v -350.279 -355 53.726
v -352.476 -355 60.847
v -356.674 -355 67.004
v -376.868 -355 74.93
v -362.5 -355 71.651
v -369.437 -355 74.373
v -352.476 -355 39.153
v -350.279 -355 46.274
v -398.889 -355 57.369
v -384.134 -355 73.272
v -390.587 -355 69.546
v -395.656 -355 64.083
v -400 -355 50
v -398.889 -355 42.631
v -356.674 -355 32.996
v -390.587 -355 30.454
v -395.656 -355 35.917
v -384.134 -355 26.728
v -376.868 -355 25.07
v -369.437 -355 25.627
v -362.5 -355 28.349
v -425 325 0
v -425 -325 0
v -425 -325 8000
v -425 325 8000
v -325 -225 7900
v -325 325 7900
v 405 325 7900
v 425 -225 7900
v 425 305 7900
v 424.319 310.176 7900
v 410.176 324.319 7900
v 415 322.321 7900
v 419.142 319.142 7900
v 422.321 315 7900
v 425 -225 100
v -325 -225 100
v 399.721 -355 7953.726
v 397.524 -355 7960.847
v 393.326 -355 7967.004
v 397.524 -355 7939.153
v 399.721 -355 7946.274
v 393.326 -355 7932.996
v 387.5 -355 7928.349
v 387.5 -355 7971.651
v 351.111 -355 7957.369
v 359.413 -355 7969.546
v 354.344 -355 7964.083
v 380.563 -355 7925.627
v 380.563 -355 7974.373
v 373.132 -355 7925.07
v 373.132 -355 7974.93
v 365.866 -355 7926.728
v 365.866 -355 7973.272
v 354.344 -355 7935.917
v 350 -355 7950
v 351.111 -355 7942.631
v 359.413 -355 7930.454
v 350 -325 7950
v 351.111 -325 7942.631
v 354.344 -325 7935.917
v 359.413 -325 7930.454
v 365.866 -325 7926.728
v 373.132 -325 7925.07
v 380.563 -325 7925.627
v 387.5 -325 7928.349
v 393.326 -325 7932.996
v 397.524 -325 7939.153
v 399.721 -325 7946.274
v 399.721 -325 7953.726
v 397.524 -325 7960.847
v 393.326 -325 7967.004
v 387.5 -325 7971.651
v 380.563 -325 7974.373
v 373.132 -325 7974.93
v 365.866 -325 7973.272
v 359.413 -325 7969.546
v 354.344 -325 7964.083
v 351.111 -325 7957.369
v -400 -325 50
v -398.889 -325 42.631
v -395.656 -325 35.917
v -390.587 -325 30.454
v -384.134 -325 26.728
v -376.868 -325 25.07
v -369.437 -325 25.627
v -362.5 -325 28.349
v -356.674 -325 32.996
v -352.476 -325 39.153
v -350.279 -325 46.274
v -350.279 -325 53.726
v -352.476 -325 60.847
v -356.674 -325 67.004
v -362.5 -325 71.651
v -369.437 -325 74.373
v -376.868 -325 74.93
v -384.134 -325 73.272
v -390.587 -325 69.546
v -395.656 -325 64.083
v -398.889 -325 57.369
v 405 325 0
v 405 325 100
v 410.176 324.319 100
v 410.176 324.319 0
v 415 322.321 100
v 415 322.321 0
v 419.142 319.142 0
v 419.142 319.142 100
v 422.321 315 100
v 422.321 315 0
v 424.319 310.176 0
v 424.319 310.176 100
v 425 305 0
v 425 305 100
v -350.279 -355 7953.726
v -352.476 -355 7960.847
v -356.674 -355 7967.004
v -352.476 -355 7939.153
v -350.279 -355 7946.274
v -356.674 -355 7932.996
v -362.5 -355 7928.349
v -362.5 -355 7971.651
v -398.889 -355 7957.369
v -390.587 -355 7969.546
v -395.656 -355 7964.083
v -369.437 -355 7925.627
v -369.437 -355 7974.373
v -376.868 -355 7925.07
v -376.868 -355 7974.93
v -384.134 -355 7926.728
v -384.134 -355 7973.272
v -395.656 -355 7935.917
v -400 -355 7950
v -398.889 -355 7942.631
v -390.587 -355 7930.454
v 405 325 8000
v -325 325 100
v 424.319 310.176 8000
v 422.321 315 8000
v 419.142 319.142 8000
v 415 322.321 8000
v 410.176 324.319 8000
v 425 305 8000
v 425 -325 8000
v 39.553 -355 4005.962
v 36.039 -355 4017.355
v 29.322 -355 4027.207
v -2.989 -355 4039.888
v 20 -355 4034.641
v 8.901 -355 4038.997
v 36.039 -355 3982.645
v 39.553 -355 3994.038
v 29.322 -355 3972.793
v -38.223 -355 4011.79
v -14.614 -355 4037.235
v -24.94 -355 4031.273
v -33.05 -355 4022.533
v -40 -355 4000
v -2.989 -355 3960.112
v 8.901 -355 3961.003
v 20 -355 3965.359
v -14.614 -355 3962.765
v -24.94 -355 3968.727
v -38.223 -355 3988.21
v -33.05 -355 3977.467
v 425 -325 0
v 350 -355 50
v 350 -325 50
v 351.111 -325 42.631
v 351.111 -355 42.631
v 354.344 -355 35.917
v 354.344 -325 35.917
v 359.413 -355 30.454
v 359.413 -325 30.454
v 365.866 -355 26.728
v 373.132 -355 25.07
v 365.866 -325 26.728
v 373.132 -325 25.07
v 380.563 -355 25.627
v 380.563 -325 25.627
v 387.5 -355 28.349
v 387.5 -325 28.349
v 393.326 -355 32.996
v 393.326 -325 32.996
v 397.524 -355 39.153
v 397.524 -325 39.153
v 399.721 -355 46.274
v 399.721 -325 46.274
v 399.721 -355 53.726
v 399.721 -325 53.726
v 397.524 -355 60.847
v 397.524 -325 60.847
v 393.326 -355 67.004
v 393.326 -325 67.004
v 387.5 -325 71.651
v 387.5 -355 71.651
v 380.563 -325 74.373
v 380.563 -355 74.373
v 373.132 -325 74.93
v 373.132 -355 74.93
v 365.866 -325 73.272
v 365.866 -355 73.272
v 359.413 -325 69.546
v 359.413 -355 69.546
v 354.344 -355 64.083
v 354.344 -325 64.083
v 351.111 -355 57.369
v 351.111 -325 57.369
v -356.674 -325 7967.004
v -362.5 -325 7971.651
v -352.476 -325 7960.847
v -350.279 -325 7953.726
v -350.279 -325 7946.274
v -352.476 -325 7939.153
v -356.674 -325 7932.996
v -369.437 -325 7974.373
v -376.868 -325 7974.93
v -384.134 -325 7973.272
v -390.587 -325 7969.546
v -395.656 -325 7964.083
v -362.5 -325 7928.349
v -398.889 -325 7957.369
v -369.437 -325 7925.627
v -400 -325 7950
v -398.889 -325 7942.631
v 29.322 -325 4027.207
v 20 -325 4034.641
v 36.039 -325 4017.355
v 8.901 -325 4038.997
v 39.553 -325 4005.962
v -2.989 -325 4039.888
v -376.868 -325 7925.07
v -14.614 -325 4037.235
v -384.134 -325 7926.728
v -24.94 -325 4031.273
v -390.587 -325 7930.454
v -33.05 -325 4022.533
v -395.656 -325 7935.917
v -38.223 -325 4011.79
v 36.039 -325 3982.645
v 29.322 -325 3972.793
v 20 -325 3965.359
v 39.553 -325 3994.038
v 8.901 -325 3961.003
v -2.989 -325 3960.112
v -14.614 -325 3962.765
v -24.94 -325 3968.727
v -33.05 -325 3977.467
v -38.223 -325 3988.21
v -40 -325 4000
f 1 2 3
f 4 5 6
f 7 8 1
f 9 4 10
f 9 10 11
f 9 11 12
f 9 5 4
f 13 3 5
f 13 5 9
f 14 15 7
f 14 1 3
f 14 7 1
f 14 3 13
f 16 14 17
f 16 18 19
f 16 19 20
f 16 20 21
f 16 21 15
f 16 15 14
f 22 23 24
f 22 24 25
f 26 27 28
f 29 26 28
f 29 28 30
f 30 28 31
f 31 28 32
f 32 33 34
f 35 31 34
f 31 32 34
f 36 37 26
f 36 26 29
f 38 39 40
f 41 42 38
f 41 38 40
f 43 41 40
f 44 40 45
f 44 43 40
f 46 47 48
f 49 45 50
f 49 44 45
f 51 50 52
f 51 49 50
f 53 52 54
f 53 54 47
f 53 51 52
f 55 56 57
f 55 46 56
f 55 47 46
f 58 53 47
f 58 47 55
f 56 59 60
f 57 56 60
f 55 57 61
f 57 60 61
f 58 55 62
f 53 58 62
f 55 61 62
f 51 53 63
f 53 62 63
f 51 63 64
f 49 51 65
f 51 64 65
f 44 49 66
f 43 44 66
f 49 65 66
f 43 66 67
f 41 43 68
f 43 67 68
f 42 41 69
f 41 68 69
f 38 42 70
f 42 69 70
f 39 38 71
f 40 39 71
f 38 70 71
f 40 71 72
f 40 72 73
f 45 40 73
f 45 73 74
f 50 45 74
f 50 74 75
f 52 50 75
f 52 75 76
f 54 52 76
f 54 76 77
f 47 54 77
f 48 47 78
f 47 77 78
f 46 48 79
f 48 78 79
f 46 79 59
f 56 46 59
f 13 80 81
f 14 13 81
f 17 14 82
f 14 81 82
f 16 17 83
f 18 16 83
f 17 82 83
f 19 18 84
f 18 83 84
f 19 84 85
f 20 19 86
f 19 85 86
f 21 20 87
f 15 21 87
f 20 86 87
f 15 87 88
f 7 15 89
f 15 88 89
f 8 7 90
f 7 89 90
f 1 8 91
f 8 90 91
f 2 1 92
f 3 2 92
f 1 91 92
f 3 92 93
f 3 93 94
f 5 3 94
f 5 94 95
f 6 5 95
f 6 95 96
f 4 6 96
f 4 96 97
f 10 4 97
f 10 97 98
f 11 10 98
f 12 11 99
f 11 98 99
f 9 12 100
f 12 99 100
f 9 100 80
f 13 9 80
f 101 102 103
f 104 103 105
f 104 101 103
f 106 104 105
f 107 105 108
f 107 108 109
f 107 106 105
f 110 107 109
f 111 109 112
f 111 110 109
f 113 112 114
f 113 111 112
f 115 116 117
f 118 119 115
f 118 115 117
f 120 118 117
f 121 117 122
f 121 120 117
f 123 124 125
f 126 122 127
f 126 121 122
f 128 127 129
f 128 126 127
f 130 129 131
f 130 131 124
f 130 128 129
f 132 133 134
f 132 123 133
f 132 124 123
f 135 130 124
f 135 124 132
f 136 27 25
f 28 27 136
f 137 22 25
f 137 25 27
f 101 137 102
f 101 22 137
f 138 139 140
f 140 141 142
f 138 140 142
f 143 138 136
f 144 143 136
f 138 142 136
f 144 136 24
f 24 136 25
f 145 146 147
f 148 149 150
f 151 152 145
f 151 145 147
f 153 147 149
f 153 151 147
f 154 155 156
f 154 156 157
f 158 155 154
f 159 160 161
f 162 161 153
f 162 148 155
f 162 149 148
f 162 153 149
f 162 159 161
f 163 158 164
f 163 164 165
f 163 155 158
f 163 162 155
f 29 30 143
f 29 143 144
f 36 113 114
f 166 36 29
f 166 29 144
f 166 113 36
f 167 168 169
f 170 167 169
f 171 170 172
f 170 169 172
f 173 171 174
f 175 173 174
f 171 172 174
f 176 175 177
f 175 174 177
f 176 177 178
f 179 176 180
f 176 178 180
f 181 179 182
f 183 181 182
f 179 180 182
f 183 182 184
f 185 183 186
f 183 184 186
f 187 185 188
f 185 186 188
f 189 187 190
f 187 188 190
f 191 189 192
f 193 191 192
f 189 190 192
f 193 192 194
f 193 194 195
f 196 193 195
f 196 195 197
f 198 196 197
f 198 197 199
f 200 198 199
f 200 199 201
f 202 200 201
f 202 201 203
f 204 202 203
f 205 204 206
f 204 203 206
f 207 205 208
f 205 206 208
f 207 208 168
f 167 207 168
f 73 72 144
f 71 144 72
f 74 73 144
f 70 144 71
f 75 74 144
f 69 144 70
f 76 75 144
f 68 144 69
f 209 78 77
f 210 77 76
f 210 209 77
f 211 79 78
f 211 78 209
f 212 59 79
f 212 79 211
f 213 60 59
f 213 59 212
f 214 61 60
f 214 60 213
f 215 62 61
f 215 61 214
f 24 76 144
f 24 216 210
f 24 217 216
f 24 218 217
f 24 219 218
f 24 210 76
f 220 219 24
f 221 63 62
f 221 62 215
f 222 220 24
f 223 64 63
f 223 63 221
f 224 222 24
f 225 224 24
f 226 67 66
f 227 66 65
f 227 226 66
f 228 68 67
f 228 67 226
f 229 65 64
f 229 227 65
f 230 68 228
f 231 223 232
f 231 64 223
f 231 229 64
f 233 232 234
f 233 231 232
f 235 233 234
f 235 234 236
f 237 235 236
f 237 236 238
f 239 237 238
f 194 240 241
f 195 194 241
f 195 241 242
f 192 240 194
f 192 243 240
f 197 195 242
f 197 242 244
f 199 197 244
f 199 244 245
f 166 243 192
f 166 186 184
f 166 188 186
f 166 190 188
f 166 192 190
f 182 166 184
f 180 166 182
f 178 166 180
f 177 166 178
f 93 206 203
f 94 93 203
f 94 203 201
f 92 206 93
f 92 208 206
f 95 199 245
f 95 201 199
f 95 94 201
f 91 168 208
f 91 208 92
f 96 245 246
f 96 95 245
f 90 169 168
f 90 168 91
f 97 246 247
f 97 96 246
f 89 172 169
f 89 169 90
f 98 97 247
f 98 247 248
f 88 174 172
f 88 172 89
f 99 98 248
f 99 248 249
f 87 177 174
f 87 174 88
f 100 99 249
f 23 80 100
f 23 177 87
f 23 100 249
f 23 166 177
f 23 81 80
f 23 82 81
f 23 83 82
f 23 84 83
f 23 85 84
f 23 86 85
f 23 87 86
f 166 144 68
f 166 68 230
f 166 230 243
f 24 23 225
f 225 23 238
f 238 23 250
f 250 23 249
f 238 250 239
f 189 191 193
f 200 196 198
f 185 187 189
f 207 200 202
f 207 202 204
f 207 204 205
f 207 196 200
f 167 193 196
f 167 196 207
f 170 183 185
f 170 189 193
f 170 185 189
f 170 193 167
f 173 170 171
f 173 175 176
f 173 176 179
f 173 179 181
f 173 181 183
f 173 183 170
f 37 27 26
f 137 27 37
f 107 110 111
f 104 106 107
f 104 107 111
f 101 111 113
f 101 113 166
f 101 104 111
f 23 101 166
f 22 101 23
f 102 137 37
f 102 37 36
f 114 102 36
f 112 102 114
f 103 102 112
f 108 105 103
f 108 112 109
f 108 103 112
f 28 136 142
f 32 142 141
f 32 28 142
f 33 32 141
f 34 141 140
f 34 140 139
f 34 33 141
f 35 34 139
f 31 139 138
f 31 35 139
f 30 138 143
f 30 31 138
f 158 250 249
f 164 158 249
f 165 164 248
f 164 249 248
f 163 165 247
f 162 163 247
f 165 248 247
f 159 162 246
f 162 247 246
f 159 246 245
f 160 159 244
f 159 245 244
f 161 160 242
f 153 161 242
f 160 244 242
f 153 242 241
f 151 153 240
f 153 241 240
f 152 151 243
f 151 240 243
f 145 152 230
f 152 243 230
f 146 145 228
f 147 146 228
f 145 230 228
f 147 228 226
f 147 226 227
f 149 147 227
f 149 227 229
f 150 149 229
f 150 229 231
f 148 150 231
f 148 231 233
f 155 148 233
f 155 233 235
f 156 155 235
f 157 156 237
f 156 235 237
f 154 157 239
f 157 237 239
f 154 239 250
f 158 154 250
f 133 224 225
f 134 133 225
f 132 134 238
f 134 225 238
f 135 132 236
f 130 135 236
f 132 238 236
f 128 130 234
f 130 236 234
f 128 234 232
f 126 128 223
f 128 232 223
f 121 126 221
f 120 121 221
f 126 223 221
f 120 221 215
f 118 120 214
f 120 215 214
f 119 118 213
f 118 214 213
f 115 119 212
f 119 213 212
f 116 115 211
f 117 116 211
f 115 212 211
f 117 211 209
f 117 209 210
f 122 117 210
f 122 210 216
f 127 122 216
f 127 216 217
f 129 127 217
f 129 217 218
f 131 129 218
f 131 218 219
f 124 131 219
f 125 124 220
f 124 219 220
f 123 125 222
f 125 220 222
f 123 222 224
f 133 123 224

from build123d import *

# Parameters (mm, degrees)
BOSS_EXTRUDE1_DEPTH = 8000
SKETCH3_W           = 750
SKETCH3_H           = 7800
CUT_EXTRUDE1_DEPTH  = 550
SKETCH4_R           = 25
SKETCH4_R_2         = 40
BOSS_EXTRUDE2_DEPTH = 30


with BuildPart() as part:
    # Sketch2 → Boss-Extrude1 (new body)
    with BuildSketch(Plane.XY):
        with BuildLine():
            Line((-425, 325), (405, 325))
            ThreePointArc((405, 325), (419.142135624, 319.142135624), (425, 305))
            Line((425, 305), (425, -325))
            Line((425, -325), (-425, -325))
            Line((-425, -325), (-425, 325))
        make_face()
    extrude(amount=BOSS_EXTRUDE1_DEPTH)

    # Sketch3 → Cut-Extrude1 (cut)
    with BuildSketch(Plane(origin=(0, 325, 0), x_dir=(1, 0, 0), z_dir=(0, 1, 0))):
        with Locations((50, -4000)):
            Rectangle(SKETCH3_W, SKETCH3_H)
    extrude(amount=-CUT_EXTRUDE1_DEPTH, mode=Mode.SUBTRACT)

    # Sketch4 → Boss-Extrude2 (add)
    with BuildSketch(Plane(origin=(0, -325, 0), x_dir=(-1, 0, 0), z_dir=(0, -1, 0))):
        with Locations((375, -7950)):
            Circle(SKETCH4_R)
        with Locations((-375, -7950)):
            Circle(SKETCH4_R)
        with Locations((375, -50)):
            Circle(SKETCH4_R)
        with Locations((-375, -50)):
            Circle(SKETCH4_R)
        with Locations((0, -4000)):
            Circle(SKETCH4_R_2)
    extrude(amount=BOSS_EXTRUDE2_DEPTH)


solid = part.part
